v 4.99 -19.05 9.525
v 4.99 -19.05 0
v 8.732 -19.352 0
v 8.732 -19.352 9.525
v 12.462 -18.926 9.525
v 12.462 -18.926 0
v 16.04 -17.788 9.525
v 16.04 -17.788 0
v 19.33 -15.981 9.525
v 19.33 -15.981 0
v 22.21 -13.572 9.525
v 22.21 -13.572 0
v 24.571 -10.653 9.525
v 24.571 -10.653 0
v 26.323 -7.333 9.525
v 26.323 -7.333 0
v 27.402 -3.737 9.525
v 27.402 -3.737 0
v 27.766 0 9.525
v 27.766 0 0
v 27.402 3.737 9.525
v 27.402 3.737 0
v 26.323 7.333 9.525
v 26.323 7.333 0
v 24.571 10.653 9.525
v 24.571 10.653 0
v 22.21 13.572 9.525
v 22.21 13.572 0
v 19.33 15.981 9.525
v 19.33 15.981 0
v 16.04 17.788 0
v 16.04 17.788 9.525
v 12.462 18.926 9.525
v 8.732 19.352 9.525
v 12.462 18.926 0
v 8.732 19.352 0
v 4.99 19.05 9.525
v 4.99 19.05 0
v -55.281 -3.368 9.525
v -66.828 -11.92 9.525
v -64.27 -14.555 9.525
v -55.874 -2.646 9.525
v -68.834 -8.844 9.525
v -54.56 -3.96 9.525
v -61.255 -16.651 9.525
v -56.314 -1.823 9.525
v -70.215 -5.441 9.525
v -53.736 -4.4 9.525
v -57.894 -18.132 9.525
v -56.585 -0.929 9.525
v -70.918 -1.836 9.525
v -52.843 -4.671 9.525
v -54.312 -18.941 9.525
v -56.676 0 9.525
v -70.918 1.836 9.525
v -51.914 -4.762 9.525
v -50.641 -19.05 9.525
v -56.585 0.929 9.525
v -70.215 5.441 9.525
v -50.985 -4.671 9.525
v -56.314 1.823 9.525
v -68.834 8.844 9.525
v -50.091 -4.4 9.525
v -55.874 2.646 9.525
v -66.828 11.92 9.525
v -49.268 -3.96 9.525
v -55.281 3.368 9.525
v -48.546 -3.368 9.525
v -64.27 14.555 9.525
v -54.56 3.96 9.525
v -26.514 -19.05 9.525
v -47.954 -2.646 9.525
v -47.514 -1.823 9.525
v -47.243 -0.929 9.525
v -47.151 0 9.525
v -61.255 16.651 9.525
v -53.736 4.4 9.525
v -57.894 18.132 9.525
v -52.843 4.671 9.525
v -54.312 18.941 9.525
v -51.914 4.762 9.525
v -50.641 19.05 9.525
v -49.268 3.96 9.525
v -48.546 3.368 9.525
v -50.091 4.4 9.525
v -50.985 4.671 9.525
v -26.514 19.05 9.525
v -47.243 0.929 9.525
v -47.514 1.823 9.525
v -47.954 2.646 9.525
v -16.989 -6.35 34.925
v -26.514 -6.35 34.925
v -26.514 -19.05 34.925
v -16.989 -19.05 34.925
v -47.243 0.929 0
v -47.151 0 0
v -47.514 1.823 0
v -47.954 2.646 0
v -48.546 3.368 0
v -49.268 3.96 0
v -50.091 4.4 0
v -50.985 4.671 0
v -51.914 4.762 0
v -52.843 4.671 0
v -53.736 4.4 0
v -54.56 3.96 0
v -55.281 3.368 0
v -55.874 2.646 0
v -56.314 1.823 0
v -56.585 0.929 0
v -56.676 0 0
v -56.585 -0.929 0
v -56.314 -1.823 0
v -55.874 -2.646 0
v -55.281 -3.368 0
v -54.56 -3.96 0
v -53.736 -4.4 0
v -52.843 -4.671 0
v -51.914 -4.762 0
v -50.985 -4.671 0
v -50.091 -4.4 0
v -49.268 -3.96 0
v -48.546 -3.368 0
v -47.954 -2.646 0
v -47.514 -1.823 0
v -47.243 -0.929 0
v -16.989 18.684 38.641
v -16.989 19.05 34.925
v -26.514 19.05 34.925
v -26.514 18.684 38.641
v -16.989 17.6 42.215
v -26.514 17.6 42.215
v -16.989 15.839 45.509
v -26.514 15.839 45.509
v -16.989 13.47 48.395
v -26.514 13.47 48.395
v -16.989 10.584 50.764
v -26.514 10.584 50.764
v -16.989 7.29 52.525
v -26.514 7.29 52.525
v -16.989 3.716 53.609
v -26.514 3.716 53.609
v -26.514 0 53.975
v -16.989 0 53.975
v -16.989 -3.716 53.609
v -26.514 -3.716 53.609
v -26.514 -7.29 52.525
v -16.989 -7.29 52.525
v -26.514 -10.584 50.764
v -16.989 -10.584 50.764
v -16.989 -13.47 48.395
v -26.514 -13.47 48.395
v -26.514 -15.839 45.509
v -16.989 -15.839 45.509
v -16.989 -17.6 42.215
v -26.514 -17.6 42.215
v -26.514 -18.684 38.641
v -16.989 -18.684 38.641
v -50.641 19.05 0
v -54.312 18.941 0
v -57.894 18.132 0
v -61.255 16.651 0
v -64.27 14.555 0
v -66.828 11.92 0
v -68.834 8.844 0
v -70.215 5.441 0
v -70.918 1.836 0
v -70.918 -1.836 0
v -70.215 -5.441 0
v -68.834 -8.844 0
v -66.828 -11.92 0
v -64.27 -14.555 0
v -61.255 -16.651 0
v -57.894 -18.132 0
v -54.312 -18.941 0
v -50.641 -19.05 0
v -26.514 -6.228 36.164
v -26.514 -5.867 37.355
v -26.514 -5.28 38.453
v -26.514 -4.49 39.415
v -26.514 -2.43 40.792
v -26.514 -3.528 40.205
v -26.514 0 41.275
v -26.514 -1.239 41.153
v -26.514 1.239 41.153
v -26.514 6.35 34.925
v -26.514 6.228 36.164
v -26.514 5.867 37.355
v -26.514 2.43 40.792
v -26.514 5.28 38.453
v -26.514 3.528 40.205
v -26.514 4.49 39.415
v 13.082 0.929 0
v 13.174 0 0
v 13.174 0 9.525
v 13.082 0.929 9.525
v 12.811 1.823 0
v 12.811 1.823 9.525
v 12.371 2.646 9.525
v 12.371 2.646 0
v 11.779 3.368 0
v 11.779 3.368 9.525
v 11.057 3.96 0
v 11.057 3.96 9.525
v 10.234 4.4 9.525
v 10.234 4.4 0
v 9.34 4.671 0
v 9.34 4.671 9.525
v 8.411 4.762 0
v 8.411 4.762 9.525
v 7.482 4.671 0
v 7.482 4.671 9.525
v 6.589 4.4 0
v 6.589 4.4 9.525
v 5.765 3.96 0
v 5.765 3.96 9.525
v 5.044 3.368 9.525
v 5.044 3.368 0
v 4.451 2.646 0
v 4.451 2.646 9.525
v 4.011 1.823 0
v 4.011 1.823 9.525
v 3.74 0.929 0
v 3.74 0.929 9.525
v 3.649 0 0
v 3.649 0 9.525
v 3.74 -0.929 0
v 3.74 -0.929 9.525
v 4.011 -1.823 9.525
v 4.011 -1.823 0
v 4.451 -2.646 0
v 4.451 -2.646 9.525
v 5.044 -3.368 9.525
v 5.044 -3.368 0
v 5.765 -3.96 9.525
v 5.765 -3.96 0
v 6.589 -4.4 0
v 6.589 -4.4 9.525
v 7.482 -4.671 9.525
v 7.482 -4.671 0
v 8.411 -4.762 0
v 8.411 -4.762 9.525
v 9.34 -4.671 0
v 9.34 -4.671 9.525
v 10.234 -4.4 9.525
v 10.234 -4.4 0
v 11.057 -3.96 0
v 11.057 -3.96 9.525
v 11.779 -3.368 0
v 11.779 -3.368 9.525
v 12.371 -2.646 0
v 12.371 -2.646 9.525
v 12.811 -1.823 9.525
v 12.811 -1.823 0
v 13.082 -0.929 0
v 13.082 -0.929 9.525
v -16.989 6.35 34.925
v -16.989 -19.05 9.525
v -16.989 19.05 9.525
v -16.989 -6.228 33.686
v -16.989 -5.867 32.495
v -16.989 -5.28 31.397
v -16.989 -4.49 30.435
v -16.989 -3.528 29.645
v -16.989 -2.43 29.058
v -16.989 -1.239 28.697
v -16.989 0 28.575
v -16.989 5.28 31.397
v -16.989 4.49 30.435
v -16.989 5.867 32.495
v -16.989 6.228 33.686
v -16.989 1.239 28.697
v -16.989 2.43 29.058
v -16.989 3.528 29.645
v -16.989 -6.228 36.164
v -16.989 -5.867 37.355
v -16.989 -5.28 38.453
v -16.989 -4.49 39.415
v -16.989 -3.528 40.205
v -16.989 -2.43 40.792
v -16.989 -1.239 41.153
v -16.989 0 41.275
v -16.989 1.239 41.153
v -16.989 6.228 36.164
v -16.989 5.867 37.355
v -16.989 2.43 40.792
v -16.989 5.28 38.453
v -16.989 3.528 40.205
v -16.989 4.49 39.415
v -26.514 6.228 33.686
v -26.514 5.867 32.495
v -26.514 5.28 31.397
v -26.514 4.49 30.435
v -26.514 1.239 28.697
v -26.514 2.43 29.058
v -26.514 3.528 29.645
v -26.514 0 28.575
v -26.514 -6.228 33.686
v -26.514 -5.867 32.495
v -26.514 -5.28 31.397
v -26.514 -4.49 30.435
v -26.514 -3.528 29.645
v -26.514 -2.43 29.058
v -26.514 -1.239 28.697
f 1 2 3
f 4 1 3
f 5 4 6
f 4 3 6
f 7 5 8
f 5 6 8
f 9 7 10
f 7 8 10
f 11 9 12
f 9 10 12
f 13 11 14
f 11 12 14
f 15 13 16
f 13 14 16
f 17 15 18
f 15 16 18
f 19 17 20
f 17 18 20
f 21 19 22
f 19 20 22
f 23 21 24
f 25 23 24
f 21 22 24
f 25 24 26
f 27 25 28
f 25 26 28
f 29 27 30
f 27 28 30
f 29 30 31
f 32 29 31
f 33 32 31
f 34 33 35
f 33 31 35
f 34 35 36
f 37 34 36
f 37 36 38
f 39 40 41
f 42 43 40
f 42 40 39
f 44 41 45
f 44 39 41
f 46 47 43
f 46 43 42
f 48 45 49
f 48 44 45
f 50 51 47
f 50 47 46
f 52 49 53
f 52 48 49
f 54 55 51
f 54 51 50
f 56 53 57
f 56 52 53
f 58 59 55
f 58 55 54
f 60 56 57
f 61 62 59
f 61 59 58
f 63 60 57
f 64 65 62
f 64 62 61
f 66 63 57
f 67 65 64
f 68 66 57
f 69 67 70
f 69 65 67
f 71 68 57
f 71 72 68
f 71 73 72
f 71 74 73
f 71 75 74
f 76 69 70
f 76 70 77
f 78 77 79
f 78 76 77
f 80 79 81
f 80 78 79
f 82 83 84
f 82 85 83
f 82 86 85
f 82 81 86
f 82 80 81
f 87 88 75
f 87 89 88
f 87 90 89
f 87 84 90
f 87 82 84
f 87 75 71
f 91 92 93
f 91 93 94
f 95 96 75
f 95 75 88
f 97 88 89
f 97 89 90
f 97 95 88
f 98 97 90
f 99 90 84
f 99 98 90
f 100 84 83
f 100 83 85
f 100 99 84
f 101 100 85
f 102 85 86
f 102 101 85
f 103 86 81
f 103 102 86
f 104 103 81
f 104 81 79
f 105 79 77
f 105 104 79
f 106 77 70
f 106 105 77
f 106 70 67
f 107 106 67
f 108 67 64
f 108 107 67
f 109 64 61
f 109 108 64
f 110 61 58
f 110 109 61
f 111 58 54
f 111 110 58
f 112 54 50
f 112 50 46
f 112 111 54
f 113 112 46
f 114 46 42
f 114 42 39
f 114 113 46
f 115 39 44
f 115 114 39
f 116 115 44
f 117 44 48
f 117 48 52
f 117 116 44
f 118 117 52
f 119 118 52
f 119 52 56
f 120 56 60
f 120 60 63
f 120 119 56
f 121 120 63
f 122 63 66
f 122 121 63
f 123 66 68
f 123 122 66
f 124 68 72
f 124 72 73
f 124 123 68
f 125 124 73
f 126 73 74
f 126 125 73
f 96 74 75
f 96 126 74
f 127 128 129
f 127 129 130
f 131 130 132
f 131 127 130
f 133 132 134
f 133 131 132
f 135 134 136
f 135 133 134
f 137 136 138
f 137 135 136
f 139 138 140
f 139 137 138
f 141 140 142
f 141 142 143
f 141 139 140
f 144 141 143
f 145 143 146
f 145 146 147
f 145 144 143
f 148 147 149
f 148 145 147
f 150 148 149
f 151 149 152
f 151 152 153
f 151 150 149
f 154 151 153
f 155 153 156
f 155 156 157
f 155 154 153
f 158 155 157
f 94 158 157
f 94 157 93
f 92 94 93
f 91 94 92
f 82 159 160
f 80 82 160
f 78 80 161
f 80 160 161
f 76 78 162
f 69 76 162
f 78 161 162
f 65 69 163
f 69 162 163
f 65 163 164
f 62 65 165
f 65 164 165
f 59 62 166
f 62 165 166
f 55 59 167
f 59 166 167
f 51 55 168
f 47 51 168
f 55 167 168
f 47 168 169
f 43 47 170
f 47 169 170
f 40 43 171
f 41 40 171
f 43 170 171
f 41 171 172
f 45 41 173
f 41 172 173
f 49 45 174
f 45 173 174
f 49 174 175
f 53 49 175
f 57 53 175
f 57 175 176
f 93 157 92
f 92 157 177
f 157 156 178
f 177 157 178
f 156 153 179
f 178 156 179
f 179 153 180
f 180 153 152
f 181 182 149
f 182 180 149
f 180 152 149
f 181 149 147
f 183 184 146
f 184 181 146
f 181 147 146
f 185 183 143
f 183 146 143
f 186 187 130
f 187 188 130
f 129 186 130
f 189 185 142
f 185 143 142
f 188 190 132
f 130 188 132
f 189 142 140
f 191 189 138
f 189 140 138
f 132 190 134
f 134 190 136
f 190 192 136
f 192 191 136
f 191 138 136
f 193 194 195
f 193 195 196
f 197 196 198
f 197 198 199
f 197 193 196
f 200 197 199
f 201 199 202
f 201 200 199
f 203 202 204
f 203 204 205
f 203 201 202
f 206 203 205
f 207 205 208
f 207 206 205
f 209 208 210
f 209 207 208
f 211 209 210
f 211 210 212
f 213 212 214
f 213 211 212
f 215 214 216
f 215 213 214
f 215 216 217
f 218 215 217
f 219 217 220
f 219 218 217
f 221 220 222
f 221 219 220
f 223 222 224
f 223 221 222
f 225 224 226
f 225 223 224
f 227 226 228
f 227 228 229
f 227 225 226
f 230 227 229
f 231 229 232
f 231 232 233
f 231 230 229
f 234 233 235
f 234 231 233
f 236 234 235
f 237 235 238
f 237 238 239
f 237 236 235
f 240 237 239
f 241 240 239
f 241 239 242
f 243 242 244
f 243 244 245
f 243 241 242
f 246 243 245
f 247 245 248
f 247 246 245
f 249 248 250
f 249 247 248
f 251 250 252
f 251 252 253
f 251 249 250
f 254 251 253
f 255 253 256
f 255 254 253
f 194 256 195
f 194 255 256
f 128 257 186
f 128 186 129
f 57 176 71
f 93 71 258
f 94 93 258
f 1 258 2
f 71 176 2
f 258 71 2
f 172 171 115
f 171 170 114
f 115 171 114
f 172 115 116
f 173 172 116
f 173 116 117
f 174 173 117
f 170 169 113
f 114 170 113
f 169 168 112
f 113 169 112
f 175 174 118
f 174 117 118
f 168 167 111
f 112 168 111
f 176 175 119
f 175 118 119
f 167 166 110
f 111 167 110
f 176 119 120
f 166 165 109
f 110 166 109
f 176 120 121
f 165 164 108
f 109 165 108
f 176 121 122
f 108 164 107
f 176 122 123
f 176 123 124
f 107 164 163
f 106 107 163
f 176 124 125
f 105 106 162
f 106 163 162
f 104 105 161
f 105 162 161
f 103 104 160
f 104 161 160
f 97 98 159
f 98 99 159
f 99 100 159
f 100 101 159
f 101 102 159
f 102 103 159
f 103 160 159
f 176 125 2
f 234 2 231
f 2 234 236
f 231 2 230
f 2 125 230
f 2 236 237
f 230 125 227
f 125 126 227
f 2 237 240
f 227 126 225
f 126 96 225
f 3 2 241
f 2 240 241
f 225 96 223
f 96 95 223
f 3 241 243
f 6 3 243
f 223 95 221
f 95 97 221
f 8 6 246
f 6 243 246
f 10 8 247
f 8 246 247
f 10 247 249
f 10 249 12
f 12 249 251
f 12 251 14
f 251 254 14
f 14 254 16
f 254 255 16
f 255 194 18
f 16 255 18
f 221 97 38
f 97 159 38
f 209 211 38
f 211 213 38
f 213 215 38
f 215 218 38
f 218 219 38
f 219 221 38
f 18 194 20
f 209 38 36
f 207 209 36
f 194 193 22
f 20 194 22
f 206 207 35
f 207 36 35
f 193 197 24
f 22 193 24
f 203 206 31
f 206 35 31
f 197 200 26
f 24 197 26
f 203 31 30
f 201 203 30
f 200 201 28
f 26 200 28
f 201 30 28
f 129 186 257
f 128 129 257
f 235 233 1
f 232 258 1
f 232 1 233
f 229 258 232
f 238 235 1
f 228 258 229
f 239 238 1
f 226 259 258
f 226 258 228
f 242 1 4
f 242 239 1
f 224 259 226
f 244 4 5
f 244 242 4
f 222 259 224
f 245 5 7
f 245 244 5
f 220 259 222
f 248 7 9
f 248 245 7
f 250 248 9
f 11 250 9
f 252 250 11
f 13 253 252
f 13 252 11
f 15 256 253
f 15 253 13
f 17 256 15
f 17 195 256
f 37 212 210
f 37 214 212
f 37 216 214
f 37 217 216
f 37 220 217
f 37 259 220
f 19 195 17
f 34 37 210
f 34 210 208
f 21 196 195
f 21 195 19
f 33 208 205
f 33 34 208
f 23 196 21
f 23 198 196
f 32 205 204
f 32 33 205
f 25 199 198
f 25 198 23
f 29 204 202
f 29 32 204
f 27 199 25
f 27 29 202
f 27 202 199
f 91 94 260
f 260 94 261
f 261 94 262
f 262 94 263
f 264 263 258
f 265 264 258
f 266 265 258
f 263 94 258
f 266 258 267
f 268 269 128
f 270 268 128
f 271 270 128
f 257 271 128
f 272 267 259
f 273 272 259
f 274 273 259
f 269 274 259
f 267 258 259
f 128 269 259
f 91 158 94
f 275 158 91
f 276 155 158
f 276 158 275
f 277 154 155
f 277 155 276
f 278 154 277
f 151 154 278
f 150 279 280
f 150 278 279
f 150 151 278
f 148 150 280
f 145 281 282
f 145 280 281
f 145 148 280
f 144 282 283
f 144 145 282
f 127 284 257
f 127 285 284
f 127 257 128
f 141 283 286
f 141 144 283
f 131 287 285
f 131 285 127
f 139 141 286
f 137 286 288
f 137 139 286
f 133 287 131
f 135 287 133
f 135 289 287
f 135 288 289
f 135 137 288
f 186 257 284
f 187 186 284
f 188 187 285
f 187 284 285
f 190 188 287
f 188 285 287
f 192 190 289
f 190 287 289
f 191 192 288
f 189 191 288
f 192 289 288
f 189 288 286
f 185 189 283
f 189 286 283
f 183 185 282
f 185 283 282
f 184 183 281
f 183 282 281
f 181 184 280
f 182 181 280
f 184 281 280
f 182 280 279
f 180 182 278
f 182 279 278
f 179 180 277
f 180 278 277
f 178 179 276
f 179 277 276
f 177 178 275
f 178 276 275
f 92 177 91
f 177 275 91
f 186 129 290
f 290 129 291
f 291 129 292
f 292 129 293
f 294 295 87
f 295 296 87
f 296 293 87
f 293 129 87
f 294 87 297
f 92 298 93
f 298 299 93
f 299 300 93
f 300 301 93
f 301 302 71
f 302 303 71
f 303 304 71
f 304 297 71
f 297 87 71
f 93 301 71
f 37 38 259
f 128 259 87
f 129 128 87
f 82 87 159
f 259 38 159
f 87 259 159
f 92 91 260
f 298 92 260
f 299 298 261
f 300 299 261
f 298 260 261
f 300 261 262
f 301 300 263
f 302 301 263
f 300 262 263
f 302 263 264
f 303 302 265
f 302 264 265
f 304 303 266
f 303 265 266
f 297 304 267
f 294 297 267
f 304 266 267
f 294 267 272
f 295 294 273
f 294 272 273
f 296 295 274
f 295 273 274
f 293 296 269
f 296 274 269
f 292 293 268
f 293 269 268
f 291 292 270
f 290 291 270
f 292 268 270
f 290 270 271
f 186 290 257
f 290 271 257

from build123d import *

# Parameters (mm, degrees)
F0_R     = 4.7625
F1_DEPTH = 9.525
F3_DEPTH = 25.4
F5_DEPTH = 9.525
F7_D     = 12.7
F7_2_D   = 12.7


with BuildPart() as f1:
    # F0 (on Top) → F1 (new body)
    with BuildSketch(Plane.XY):
        with BuildLine():
            Line((4.990128, 19.05), (-50.640772, 19.05))
            ThreePointArc((-50.640772, 19.05), (-71.006286, 0), (-50.640772, -19.05))
            Line((-50.640772, -19.05), (4.990128, -19.05))
            ThreePointArc((4.990128, -19.05), (27.76595, 0), (4.990128, 19.05))
        make_face()
        with Locations((-51.913798, 0)):
            Circle(F0_R, mode=Mode.SUBTRACT)
        with Locations((8.411202, 0)):
            Circle(F0_R, mode=Mode.SUBTRACT)
    extrude(amount=F1_DEPTH)

    # F2 (on face) → F3 (join)
    with BuildSketch(Plane.XY.offset(9.525)):
        Polygon((-26.513798, 19.05), (-26.513798, 0), (-26.513798, -19.05), (-16.988798, -19.05), (-16.988798, 0), (-16.988798, 19.05), align=None)
    extrude(amount=F3_DEPTH)

    # F7 (through all)
    with Locations(Plane(origin=(-26.513798, 0, 0), x_dir=(0, -1, 0), z_dir=(-1, 0, 0))):
        with Locations((0, 34.925)):
            Hole(F7_D / 2)


with BuildPart() as f5:
    # F4 (on face) → F5 (new body)
    with BuildSketch(Plane.YZ.offset(-16.988798)):
        with BuildLine():
            Line((-19.05, 34.925), (19.05, 34.925))
            ThreePointArc((19.05, 34.925), (0, 53.975), (-19.05, 34.925))
        make_face()
    extrude(amount=-F5_DEPTH)

    # F7#2 (through all)
    with Locations(Plane(origin=(-26.513798, 0, 0), x_dir=(0, -1, 0), z_dir=(-1, 0, 0))):
        with Locations((0, 34.925)):
            Hole(F7_2_D / 2)


solid = Compound([f1.part, f5.part])
